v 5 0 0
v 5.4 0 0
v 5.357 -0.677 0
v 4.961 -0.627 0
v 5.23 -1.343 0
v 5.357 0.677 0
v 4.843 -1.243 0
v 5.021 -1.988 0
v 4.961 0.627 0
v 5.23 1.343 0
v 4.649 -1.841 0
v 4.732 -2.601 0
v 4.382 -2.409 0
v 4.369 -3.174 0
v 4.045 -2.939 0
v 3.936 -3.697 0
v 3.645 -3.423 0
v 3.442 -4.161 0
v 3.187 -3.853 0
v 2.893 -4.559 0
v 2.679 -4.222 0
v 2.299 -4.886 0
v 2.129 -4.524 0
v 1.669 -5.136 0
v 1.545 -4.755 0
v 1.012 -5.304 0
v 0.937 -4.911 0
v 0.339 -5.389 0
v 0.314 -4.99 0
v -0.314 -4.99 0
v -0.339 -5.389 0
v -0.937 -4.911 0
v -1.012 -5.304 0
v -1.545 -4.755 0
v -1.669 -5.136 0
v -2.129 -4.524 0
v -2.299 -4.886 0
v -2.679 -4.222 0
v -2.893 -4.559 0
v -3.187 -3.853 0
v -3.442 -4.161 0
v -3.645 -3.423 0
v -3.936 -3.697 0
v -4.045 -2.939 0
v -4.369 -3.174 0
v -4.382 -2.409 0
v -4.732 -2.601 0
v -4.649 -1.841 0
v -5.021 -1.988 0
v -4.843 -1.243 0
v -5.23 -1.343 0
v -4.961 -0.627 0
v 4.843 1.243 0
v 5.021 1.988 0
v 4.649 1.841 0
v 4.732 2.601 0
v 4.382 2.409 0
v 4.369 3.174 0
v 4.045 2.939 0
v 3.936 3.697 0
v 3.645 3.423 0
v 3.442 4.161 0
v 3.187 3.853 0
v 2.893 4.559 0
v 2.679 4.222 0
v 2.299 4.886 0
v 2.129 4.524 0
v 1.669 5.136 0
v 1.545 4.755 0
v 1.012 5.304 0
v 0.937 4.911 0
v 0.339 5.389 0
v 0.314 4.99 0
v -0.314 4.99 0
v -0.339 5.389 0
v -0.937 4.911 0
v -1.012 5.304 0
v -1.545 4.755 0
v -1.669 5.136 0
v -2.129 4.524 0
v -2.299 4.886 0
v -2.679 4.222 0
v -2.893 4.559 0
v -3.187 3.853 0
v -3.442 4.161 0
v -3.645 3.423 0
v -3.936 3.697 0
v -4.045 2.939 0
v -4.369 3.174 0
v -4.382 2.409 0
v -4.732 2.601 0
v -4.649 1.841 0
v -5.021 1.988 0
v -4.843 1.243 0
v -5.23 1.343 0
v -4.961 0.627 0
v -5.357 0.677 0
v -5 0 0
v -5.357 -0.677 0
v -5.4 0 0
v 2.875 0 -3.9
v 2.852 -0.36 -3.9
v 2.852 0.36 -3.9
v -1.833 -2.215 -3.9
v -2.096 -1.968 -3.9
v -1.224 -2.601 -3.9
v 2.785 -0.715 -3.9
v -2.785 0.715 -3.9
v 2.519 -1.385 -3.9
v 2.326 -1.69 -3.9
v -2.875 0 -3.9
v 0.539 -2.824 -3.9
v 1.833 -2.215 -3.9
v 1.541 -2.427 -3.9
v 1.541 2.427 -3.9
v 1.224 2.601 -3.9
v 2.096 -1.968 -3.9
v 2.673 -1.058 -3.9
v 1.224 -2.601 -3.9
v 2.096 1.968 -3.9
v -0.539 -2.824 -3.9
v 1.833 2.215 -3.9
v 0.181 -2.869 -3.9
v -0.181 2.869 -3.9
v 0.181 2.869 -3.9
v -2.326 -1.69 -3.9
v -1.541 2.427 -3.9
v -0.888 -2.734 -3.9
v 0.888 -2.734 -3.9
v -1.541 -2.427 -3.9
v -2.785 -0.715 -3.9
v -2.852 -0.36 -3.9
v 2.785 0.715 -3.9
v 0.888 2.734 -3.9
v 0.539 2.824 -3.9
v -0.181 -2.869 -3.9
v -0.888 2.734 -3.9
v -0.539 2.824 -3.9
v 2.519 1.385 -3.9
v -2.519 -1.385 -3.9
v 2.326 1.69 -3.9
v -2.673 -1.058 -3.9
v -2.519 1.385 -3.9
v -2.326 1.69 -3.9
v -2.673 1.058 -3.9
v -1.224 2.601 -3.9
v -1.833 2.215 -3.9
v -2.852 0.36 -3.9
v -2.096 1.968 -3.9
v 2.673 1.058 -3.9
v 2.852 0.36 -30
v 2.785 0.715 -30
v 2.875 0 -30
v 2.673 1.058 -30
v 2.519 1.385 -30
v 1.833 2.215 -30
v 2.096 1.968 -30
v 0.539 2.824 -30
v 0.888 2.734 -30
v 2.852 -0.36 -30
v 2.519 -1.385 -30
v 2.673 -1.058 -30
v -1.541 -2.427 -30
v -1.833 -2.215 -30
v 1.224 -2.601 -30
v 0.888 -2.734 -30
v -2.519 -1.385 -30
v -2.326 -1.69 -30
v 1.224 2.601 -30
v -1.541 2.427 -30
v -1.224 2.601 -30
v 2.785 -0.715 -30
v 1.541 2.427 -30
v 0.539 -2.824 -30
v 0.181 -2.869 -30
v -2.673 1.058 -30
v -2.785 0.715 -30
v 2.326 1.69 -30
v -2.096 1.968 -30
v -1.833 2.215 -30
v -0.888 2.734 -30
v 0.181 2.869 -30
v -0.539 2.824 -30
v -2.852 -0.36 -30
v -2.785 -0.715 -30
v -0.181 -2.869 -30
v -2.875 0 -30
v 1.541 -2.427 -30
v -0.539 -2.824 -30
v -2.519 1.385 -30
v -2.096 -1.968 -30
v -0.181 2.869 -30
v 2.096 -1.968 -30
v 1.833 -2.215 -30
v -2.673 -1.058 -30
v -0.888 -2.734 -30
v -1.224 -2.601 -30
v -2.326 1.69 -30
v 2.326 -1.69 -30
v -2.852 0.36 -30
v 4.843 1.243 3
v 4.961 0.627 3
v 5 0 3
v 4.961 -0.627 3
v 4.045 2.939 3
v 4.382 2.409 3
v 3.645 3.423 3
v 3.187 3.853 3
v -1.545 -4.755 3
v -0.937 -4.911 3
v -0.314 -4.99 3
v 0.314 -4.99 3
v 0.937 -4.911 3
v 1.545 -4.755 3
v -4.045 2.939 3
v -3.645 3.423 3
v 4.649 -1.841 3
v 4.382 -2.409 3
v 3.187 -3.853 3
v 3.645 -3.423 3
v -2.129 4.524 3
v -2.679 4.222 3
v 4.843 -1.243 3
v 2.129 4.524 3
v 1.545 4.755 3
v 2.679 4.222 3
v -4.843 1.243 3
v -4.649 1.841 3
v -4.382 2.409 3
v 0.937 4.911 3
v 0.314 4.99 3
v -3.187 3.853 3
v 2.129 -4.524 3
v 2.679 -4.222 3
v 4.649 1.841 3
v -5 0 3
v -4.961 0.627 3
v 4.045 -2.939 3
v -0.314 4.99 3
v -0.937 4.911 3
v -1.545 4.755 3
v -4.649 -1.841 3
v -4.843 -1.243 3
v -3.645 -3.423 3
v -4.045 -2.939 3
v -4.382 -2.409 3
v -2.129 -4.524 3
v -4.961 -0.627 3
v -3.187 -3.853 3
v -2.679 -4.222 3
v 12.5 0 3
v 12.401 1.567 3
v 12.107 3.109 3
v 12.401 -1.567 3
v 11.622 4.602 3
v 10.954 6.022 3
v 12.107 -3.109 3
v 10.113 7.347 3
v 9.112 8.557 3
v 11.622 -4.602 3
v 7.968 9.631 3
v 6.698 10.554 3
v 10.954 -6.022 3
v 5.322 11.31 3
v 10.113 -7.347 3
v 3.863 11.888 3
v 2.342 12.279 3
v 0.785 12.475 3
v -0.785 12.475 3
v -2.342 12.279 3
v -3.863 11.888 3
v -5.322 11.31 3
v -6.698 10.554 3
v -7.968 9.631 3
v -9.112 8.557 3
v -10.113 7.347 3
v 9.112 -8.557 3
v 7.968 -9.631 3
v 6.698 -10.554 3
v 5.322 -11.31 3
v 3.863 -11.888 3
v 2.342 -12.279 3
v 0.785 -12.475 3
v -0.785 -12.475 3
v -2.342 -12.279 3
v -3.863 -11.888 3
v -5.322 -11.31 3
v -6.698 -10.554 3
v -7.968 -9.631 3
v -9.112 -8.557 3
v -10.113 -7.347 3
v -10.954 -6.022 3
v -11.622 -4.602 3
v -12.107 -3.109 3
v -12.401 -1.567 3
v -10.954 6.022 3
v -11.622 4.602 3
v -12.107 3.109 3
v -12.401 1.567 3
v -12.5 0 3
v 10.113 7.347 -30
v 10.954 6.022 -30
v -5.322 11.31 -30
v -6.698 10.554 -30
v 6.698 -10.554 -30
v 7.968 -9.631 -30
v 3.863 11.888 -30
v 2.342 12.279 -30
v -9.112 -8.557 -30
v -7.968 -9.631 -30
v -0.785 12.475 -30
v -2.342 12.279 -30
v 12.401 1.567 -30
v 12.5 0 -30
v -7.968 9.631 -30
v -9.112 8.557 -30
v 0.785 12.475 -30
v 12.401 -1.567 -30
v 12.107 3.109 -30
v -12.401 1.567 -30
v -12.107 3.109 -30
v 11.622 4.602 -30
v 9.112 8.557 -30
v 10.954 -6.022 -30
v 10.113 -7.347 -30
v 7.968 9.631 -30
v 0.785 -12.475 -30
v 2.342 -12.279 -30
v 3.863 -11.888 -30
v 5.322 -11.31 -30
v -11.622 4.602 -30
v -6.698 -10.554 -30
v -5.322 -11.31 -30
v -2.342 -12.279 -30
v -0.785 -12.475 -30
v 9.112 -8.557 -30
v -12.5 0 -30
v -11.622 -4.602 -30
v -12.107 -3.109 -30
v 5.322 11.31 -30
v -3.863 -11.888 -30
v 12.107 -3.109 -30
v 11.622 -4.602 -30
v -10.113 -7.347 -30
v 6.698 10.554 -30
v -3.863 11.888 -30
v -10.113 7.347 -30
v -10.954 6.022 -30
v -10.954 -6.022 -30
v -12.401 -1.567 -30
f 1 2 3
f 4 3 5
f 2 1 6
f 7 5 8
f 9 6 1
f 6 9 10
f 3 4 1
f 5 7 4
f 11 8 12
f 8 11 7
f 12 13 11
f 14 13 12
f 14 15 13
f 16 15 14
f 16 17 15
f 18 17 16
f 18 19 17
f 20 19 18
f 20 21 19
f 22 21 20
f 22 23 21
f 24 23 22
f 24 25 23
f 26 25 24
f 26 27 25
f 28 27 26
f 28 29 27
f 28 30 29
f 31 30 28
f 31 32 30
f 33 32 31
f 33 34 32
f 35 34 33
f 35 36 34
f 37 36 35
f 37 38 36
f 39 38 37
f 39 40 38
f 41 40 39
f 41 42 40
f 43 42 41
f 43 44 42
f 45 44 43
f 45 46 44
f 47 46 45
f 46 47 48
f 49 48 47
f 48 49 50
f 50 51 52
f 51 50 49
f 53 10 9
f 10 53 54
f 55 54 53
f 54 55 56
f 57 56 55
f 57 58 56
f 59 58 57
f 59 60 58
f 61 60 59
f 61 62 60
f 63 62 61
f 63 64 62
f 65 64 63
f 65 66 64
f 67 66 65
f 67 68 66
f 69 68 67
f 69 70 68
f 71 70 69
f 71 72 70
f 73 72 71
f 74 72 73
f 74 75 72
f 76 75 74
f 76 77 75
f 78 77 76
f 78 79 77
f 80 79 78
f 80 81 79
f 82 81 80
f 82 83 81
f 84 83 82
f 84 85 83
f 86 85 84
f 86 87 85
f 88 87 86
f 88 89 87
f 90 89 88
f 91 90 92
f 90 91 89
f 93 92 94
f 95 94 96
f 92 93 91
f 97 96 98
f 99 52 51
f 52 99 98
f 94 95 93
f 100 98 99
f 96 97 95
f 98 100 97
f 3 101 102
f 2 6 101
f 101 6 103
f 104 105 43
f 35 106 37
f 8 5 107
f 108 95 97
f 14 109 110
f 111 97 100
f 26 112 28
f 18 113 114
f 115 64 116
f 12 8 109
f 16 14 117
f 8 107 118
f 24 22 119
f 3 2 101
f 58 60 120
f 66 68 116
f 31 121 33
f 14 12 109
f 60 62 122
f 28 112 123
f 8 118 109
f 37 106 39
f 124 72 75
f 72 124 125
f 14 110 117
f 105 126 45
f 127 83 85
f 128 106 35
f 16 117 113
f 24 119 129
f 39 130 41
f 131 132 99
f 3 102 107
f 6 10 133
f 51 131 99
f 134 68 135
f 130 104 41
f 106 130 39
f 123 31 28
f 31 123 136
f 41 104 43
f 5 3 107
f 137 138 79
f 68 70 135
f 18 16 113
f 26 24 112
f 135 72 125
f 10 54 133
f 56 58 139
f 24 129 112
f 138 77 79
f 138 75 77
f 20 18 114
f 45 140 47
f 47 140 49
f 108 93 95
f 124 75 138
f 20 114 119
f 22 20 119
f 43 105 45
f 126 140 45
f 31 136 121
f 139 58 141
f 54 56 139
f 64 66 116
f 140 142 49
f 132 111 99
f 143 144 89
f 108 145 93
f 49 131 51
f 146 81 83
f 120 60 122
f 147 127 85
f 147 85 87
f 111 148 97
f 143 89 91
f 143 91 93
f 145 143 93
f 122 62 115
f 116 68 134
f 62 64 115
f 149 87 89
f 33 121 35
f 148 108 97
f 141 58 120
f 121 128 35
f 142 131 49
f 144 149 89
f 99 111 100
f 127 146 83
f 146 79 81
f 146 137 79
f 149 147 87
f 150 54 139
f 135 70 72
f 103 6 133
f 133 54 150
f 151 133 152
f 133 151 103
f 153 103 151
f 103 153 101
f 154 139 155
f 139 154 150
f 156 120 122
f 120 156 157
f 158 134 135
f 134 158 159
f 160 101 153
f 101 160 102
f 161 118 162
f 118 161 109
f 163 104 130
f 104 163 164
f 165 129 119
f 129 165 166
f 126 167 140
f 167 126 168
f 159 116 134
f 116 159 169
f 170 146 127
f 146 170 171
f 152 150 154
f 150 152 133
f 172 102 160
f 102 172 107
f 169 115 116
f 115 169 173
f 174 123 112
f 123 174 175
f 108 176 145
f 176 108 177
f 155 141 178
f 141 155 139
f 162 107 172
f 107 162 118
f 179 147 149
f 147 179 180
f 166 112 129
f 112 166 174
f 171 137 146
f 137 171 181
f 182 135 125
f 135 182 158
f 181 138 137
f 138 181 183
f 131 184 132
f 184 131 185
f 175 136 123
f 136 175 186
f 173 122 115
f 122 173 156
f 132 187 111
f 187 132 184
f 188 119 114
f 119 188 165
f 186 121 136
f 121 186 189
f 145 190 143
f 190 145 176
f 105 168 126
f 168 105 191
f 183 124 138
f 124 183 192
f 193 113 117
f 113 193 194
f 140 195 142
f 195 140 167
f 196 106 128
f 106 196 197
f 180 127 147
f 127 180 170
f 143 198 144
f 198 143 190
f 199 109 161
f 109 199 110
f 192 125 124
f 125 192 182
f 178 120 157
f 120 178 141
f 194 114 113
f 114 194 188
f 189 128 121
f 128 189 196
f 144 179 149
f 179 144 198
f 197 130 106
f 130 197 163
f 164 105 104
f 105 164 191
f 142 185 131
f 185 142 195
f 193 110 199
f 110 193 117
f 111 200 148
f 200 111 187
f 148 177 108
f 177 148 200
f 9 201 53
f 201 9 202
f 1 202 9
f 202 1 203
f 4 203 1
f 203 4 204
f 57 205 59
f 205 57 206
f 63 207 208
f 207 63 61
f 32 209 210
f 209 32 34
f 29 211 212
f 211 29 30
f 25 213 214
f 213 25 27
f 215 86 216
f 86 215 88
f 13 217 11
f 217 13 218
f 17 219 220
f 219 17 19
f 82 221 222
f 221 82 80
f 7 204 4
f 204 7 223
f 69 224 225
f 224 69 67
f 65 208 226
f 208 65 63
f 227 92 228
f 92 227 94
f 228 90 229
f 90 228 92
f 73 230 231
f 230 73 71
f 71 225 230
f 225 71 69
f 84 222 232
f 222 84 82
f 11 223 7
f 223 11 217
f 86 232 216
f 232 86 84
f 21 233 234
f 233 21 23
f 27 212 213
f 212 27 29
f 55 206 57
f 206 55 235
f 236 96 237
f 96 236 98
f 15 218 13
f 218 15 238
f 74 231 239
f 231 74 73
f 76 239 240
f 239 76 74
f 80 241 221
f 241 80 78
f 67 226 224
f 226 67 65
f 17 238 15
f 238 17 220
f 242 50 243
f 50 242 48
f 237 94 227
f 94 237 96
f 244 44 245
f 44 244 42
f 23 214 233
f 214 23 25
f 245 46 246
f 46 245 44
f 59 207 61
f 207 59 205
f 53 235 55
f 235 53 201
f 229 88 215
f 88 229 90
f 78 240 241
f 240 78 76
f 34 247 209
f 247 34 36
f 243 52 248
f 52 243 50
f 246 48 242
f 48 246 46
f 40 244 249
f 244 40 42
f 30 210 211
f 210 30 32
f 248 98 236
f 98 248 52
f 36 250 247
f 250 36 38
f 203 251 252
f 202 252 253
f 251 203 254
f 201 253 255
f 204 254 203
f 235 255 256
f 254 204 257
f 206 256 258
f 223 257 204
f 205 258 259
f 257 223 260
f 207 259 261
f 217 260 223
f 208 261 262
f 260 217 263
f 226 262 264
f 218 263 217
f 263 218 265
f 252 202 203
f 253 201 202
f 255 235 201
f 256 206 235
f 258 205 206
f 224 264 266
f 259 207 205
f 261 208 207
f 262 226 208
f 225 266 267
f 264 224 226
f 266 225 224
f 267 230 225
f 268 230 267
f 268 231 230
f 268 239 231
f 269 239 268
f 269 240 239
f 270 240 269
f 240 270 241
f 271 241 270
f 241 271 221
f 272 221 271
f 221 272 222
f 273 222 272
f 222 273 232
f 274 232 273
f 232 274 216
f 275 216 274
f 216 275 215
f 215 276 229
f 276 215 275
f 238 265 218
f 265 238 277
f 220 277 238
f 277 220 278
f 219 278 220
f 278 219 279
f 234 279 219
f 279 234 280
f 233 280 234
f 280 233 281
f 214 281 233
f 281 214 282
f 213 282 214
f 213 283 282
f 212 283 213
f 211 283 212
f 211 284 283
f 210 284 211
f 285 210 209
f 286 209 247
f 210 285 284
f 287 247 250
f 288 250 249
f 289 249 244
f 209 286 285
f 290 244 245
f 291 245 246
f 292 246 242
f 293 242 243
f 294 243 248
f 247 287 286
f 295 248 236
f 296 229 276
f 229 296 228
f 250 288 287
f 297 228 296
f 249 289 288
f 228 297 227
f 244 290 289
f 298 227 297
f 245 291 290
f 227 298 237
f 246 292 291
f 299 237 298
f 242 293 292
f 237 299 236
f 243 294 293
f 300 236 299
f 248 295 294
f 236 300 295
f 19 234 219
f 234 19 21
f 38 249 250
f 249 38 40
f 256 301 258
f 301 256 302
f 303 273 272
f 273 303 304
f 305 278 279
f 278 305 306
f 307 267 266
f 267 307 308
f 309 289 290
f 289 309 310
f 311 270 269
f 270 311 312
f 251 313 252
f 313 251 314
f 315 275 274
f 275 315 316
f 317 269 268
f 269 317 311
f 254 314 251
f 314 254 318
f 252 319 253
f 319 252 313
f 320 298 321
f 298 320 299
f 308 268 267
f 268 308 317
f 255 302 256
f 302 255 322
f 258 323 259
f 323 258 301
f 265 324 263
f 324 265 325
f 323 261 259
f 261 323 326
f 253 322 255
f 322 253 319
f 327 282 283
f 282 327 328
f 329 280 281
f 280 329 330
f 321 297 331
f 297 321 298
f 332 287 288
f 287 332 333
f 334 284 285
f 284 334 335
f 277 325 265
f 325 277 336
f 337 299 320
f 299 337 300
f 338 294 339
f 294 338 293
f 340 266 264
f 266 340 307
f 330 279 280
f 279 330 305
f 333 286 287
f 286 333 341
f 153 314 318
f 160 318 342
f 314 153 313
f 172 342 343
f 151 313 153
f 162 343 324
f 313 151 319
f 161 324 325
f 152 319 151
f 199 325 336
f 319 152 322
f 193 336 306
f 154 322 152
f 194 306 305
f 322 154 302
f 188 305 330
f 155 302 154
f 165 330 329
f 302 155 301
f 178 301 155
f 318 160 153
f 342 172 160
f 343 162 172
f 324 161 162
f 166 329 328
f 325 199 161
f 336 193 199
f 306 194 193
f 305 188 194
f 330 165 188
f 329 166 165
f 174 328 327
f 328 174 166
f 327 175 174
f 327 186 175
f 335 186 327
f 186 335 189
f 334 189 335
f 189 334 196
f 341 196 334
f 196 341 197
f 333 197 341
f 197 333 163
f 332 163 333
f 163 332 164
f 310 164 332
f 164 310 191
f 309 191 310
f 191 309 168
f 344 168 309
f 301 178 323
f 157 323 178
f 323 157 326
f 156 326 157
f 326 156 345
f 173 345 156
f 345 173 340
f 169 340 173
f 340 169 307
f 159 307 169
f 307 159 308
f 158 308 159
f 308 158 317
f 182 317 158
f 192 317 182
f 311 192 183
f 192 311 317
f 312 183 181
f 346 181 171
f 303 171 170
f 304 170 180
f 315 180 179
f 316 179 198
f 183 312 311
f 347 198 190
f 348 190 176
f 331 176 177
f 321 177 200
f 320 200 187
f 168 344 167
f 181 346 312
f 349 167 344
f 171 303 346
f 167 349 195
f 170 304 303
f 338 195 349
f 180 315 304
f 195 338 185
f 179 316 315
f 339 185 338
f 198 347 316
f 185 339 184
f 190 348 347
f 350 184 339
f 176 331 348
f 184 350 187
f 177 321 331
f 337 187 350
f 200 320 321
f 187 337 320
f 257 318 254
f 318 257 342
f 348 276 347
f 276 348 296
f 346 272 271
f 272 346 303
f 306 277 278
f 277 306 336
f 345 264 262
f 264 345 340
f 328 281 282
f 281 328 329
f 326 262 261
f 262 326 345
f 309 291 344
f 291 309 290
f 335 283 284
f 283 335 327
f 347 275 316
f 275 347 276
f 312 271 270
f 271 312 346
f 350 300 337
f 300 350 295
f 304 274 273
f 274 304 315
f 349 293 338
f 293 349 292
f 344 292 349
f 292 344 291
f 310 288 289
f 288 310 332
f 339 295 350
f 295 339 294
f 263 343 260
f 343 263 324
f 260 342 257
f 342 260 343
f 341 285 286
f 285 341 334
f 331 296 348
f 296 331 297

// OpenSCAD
$fn = 50;


difference() {
	union() {
		translate(v = [0, 0, -30.0000000000]) {
			cylinder(h = 33, r = 12.5000000000);
		}
	}
	union() {
		translate(v = [0, 0, 0]) {
			rotate(a = [0, 0, 0]) {
				difference() {
					union() {
						translate(v = [0, 0, -33.0000000000]) {
							cylinder(h = 33, r = 2.6000000000);
						}
						translate(v = [0, 0, -3.9000000000]) {
							cylinder(h = 3.9000000000, r1 = 2.8750000000, r2 = 5.4000000000);
						}
						translate(v = [0, 0, -33.0000000000]) {
							cylinder(h = 33, r = 2.8750000000);
						}
						translate(v = [0, 0, -33.0000000000]) {
							cylinder(h = 33, r = 2.6000000000);
						}
					}
					union();
				}
			}
		}
		#cylinder(h = 3, r = 5.0000000000);
	}
}
